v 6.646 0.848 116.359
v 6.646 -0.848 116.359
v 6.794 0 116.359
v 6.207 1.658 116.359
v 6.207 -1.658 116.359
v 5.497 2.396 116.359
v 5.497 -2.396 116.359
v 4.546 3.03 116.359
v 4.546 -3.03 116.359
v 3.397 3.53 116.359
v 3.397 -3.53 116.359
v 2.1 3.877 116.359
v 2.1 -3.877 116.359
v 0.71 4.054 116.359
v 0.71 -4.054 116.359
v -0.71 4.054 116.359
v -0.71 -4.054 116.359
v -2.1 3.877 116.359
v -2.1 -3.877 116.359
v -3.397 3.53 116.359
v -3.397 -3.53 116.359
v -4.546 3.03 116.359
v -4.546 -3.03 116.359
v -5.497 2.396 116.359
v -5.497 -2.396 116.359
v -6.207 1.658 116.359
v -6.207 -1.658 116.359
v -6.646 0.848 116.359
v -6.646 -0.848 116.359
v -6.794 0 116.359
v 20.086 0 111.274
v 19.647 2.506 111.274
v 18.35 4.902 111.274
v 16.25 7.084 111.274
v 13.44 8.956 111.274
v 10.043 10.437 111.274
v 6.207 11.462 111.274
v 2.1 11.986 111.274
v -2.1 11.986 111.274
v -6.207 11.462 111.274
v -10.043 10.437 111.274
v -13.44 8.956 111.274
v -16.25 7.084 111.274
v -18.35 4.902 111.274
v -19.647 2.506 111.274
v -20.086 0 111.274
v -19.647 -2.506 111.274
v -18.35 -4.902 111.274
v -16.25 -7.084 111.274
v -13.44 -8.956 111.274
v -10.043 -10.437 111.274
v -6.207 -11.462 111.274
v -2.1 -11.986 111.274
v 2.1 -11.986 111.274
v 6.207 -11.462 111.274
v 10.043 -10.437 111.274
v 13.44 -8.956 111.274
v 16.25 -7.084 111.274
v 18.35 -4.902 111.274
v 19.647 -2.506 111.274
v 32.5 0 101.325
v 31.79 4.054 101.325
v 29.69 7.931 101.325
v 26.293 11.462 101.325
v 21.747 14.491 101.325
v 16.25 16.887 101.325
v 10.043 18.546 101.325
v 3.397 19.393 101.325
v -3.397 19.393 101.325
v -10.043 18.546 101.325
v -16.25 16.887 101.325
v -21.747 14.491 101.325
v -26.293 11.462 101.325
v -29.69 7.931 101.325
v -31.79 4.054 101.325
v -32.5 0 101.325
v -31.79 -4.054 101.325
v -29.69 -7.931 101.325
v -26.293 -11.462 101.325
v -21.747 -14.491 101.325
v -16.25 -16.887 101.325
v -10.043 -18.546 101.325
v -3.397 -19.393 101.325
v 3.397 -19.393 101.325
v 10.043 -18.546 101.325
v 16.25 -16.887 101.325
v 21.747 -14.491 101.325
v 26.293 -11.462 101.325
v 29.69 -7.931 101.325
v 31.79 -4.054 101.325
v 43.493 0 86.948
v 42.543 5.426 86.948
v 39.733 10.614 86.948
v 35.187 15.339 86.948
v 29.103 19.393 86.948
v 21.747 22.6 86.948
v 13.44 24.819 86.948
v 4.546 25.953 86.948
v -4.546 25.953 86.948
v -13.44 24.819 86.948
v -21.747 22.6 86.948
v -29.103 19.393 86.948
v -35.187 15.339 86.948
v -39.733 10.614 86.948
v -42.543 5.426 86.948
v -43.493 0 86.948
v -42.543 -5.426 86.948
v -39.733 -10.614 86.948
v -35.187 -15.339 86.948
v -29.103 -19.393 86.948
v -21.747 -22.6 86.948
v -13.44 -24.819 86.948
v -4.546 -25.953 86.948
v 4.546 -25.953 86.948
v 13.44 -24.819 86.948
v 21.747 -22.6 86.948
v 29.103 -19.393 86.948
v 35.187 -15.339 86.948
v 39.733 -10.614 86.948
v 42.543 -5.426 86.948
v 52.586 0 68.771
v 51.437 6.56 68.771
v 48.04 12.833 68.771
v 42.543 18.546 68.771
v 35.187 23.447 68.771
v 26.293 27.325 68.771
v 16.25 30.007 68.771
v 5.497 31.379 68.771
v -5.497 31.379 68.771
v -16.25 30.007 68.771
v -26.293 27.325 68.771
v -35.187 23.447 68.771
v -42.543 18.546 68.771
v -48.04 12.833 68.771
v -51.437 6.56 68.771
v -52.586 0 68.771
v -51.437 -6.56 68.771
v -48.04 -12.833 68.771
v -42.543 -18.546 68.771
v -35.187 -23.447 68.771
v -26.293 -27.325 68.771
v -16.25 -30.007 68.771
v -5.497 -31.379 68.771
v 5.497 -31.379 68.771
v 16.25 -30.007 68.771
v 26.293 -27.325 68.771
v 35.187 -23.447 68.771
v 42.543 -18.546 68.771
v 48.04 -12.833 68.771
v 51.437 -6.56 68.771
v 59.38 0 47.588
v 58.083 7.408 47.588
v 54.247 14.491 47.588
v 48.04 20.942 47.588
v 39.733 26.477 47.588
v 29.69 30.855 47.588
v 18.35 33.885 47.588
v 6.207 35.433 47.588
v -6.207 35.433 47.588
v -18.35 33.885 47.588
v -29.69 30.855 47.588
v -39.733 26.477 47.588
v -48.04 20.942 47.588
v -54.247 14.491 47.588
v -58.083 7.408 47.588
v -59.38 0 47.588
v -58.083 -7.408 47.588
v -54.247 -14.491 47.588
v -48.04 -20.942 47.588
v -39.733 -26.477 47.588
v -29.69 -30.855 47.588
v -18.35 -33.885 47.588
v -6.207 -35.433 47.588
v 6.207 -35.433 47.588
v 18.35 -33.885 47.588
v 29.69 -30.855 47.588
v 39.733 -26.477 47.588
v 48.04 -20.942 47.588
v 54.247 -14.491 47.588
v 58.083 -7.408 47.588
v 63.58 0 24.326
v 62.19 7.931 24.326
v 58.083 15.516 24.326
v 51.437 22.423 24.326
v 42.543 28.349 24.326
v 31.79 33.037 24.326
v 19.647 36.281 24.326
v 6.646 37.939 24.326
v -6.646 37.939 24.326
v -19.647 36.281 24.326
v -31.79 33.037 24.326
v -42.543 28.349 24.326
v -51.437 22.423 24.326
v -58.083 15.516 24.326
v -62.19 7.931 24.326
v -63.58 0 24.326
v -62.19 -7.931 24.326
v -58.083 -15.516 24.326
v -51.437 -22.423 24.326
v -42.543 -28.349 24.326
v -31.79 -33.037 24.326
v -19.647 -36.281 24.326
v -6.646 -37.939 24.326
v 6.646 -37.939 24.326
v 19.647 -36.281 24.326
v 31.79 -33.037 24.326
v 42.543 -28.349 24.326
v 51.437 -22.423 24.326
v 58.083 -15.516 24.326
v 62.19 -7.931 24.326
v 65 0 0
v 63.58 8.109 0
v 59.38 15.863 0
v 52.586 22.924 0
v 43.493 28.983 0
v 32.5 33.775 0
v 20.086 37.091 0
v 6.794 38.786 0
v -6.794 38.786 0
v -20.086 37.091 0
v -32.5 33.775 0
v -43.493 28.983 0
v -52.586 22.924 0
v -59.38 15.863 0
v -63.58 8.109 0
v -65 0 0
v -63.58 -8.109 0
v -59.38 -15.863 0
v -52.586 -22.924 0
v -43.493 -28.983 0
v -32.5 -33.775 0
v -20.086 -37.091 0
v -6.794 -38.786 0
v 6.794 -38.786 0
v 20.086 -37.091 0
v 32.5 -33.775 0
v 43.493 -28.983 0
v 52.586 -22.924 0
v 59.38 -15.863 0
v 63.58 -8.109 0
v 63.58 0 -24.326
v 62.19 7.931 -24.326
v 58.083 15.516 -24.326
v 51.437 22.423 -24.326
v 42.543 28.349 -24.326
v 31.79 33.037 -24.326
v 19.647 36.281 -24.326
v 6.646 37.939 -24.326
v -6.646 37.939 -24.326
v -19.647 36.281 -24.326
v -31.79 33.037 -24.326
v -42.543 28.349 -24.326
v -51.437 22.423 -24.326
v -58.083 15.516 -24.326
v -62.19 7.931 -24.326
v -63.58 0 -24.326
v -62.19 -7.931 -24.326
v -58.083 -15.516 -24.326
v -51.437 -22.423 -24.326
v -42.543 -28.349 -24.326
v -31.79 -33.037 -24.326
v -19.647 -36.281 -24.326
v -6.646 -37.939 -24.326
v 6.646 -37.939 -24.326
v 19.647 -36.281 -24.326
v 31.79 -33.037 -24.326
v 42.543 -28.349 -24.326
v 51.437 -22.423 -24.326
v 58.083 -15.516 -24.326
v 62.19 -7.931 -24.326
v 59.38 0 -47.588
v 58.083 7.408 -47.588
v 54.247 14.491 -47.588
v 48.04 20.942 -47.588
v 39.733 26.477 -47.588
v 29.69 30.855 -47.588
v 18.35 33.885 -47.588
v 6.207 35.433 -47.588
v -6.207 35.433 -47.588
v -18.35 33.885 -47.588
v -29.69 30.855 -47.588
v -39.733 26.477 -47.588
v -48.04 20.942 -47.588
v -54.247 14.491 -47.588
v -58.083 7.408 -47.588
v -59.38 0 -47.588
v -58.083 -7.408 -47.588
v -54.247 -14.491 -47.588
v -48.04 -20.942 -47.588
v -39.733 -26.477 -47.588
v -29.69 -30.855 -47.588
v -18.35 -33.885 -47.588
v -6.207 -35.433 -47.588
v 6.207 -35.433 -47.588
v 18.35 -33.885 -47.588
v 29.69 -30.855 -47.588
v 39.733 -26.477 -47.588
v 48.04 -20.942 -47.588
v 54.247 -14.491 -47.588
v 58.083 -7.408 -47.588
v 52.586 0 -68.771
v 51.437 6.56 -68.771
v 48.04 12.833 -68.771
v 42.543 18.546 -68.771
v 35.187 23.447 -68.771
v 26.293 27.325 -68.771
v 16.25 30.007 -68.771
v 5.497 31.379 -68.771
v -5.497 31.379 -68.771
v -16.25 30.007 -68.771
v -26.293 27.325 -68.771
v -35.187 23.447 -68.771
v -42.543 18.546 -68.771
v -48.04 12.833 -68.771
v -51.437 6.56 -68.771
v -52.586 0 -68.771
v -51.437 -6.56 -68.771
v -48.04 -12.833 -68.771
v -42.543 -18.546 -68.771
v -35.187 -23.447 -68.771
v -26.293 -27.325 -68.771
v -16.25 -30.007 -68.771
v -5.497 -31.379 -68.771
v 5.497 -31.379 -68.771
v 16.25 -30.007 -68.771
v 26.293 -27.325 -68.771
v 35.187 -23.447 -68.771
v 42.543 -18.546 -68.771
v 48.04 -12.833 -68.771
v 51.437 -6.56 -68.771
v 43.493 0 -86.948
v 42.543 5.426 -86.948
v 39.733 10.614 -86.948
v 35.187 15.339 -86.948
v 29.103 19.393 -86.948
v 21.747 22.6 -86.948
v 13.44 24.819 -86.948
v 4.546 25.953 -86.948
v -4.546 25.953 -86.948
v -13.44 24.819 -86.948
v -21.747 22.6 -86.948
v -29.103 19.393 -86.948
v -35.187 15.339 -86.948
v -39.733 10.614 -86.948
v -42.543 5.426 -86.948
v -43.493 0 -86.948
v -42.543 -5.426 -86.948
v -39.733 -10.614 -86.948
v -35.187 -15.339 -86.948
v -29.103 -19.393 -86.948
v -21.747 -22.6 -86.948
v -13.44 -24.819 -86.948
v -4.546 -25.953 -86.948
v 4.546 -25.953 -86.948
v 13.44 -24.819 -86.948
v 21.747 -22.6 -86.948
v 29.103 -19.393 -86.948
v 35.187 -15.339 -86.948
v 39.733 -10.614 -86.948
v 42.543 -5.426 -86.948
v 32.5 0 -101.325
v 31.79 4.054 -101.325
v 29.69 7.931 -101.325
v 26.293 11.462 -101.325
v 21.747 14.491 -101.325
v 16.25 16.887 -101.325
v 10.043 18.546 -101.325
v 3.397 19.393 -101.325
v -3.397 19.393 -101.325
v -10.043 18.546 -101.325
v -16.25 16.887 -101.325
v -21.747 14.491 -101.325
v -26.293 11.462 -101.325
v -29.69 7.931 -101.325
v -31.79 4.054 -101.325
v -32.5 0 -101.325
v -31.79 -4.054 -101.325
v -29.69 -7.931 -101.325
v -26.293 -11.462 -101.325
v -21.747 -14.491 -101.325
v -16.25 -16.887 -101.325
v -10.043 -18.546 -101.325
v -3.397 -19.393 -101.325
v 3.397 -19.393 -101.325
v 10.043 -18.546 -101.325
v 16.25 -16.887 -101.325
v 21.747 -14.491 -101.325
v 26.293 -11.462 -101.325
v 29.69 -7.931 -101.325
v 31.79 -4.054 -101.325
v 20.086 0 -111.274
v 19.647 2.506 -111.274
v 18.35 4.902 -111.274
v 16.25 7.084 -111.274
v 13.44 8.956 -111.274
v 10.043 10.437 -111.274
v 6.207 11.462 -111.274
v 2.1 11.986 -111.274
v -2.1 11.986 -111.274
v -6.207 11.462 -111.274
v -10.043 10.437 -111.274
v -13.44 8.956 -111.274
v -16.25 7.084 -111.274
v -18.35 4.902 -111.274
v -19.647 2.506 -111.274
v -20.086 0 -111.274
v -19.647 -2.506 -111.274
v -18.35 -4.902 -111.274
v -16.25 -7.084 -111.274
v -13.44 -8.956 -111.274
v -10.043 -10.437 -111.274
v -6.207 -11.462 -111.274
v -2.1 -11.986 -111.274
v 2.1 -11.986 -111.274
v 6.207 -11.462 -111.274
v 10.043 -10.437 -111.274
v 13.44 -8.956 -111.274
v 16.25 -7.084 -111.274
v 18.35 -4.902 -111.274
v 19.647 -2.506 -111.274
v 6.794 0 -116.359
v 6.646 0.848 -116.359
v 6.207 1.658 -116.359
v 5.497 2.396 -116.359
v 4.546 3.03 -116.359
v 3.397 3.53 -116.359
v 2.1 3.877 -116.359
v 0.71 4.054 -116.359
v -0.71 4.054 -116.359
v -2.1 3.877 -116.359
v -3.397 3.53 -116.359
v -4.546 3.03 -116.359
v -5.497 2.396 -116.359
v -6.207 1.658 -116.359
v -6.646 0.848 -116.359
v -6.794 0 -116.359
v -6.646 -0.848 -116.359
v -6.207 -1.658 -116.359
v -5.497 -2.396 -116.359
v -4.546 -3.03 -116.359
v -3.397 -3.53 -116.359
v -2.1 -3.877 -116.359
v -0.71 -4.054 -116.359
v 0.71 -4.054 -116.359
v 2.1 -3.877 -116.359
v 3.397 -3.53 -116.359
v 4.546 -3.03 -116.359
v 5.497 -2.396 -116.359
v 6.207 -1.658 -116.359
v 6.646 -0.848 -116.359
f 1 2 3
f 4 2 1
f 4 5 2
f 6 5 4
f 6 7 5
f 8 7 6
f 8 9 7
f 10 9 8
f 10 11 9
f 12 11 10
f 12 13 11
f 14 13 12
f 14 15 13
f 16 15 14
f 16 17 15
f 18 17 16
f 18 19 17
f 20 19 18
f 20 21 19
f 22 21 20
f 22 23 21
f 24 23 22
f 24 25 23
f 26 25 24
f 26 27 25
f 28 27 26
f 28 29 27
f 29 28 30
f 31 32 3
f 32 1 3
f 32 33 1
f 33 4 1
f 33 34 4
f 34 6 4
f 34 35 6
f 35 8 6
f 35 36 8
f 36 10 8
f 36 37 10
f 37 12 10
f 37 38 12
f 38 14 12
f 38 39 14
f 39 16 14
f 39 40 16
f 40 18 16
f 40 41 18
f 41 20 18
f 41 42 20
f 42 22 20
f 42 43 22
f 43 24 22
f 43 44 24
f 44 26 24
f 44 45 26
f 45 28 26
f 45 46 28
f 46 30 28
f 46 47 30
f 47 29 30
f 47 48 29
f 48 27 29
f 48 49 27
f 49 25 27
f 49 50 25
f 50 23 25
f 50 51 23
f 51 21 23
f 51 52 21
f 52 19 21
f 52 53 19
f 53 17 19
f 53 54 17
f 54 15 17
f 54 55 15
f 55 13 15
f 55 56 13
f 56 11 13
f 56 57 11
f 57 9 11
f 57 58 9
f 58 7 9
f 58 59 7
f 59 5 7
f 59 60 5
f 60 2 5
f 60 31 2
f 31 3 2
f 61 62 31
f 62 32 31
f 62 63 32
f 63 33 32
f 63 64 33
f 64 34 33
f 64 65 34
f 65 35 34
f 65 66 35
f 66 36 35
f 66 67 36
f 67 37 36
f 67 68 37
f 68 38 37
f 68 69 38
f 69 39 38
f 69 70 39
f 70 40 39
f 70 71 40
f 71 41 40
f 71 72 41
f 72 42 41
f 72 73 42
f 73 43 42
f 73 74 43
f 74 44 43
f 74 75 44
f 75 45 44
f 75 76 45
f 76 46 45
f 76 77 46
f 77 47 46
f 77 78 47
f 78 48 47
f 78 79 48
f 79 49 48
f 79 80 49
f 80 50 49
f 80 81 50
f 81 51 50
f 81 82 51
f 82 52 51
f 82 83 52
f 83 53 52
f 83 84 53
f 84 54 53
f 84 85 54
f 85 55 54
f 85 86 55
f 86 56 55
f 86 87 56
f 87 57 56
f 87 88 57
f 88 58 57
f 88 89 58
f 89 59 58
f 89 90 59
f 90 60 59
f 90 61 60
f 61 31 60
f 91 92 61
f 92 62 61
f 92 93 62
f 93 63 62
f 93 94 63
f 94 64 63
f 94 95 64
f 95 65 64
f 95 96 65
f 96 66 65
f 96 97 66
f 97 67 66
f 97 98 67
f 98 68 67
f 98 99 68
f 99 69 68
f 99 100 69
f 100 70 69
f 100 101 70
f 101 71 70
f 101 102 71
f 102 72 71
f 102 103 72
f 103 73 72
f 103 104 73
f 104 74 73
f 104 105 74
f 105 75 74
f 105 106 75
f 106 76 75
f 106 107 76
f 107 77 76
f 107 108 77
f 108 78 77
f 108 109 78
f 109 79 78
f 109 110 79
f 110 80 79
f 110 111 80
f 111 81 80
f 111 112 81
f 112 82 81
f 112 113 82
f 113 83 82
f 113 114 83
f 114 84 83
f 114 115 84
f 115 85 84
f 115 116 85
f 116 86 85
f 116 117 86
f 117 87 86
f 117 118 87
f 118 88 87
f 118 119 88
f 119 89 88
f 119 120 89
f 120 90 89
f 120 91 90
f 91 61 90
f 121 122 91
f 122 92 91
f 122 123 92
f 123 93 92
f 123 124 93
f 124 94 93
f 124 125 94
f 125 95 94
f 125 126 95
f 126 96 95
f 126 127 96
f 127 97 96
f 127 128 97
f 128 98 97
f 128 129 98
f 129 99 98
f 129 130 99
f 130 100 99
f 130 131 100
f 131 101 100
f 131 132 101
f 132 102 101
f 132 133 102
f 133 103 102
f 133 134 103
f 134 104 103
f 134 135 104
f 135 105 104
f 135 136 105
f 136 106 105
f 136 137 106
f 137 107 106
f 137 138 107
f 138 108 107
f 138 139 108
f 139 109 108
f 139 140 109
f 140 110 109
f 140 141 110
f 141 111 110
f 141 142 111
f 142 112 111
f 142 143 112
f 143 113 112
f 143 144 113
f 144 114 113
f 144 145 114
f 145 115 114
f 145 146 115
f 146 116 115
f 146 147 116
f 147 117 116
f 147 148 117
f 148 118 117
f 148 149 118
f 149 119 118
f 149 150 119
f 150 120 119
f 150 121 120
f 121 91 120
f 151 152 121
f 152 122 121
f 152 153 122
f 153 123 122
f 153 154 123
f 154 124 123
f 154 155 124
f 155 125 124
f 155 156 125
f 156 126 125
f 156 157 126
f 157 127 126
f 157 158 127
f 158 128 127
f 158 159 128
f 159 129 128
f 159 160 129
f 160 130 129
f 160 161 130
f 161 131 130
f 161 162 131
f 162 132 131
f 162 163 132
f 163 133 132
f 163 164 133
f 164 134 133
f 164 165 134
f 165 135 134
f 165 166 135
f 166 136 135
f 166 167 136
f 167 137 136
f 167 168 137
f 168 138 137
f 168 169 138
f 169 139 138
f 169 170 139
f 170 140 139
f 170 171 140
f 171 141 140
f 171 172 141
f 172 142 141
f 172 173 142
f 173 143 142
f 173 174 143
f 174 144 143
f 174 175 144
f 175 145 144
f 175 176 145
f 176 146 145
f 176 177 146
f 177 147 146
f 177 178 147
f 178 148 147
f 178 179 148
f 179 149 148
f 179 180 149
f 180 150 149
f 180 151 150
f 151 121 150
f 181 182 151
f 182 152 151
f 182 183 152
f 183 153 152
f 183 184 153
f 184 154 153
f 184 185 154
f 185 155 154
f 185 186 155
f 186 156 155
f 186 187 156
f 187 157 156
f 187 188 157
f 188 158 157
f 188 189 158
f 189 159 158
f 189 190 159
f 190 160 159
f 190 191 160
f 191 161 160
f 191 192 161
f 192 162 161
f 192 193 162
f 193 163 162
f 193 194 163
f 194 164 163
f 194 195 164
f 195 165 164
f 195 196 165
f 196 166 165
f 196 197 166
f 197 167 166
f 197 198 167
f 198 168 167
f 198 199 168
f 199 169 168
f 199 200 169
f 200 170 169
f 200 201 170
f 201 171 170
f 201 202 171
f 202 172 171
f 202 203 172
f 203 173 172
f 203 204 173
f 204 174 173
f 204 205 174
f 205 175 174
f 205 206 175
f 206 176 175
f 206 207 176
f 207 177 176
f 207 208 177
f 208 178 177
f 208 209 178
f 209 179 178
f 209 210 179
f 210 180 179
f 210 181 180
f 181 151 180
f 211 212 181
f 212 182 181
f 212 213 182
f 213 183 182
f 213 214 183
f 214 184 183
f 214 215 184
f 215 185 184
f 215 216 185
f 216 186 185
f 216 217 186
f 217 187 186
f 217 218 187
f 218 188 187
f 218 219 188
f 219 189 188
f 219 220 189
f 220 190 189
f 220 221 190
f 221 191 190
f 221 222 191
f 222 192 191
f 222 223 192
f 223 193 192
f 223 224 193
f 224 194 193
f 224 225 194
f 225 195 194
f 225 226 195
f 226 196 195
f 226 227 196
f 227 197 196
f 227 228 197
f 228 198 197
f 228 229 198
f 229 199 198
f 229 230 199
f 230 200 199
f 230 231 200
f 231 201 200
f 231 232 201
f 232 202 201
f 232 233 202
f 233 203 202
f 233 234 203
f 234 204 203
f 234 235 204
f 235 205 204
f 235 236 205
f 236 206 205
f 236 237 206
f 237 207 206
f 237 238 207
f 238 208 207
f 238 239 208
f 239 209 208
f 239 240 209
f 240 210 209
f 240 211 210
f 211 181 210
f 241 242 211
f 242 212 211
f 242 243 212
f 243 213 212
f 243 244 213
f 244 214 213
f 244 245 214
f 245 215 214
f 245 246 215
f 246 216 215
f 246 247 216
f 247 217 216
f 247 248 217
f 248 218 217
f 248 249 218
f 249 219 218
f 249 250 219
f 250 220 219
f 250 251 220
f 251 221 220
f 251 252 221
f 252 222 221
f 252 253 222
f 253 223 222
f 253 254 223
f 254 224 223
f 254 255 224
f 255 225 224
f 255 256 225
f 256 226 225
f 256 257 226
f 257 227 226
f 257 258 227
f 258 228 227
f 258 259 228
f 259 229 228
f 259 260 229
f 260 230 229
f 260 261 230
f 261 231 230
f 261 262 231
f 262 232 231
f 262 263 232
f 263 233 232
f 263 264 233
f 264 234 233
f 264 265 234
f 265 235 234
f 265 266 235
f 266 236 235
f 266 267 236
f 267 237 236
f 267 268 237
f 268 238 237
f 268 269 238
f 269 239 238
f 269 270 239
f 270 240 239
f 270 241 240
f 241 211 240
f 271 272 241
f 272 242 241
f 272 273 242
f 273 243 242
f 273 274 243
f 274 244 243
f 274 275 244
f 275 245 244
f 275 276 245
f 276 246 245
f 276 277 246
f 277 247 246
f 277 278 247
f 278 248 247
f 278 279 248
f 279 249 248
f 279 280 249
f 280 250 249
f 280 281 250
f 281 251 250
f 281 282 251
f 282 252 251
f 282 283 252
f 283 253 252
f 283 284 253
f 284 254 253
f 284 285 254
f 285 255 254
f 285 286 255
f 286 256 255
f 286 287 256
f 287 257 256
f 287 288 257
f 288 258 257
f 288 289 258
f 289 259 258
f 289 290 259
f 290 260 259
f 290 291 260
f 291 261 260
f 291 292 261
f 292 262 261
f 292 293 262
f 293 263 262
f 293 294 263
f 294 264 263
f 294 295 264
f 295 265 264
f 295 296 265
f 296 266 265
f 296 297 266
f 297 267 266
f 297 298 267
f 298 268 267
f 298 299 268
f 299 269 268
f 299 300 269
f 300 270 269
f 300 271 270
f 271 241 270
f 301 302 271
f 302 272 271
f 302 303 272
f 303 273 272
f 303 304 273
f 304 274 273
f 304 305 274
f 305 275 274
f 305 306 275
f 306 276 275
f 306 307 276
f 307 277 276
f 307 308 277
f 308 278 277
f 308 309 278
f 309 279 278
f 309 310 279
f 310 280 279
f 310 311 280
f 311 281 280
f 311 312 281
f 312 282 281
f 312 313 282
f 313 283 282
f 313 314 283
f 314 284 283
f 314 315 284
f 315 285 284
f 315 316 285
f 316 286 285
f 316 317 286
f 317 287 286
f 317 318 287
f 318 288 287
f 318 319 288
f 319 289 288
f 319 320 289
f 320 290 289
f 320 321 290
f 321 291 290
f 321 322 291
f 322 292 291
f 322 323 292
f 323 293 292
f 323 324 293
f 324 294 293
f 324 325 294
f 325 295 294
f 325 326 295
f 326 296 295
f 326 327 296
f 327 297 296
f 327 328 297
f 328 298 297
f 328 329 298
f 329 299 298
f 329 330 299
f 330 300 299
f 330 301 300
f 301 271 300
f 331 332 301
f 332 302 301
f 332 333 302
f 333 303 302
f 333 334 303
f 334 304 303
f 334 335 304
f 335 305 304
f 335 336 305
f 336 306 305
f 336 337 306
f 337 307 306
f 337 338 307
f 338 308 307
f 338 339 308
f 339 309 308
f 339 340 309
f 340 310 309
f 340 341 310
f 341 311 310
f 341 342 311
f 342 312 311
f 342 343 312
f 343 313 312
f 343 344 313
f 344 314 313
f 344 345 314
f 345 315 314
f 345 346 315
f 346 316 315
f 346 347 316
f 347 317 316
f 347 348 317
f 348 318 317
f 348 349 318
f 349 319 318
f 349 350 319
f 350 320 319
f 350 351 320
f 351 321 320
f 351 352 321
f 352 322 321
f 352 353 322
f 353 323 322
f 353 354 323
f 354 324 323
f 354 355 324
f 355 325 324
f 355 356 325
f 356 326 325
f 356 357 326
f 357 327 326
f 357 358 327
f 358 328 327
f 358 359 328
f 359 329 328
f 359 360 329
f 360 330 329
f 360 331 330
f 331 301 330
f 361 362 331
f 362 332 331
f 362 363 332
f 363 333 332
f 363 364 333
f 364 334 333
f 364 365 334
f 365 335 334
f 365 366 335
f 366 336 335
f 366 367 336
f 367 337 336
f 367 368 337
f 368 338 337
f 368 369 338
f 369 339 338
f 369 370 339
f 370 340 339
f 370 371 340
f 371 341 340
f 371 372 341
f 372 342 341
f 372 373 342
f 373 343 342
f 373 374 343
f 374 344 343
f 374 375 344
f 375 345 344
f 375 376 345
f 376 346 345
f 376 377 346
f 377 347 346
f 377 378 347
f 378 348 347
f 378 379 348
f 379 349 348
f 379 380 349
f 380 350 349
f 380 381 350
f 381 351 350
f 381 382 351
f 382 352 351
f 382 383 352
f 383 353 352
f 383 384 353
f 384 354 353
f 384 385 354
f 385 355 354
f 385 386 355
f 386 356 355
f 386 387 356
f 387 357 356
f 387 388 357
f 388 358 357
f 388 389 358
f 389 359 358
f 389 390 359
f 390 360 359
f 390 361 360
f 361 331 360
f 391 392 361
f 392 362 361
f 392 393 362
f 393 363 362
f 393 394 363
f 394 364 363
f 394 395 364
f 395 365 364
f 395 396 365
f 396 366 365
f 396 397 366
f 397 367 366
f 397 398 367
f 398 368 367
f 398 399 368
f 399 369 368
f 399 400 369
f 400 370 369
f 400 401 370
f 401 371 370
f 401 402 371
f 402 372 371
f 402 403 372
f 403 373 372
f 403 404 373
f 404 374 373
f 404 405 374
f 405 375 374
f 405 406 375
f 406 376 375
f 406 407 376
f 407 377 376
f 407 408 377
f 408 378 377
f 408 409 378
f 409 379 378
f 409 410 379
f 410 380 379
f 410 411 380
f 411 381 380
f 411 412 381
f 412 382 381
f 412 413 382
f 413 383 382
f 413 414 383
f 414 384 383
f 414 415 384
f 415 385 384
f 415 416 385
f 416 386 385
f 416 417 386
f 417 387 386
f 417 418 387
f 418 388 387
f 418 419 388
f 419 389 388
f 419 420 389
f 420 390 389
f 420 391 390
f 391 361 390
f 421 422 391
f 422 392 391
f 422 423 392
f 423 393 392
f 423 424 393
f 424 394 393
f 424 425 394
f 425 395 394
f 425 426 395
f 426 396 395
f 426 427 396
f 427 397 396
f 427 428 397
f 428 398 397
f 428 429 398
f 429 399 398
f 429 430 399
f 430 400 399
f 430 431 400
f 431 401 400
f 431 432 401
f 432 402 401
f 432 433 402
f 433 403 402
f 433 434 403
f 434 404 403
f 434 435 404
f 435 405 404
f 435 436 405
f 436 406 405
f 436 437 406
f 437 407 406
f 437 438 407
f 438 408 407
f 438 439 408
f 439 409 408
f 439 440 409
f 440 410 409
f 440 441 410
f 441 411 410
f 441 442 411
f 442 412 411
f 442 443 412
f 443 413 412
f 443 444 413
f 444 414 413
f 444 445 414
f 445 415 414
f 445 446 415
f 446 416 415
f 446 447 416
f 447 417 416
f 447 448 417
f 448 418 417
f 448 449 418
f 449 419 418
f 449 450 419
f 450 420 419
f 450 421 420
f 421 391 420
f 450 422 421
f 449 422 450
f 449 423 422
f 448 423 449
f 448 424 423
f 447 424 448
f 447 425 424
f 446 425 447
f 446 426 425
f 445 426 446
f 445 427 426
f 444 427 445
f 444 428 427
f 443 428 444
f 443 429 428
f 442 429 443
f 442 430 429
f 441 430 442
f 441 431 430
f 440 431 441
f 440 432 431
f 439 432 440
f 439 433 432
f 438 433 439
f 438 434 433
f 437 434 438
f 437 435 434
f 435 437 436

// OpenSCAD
// Generated by SolidPython 1.0.1 on 2020-07-29 00:46:46


scale(v = [5, 3, 9]) {
	sphere(r = 13);
}
/***********************************************
*********      SolidPython code:      **********
************************************************
 
# import packages: SolidPython
from solid import *
from solid.utils import *
from itertools import chain, combinations, permutations


class Resize:

    def __init__(self, scad_file):
        self.scad_file = scad_file
        #self.scad_file = import_scad(scad_file)
        # cone/cylinder param:
        self.r1 = 0
        self.r2 = 0
        self.h = 0
        # rectangular prism param:
        self.w = 0
        self.l = 0
        # ellipse param:
        self.r = 0

    # import OpenScad code (file name corresponds to shape)


    # classify shape + parameters
    def assign(self, param1, param2, param3):
        if self.scad_file == 'cone.scad':
            self.r1 = param1
            self.r2 = param2
            self.h = param3
        elif self.scad_file == 'cylinder.scad':
            self.r1 = param1
            self.r2 = param2
            self.h = param3
        elif self.scad_file == 'rectangularPrism.scad':
            self.h = param1
            self.l = param2
            self.w = param3
        else:
            self.r = param1
            self.h = param2

    # resize parameters
    def iterate(self):
        x = range(3, 20, 2)
        i = 1
        if self.scad_file == 'cone.scad':
            tempList = list(permutations(x, 2))
            for temp in tempList:
                param1 = temp[0]
                param2 = temp[1]
                filepath = 'produced_scad_files/' + 'cone' + str(param1) + '_' + str(param2) + '_' + '.scad'
                scad_render_to_file(cylinder(h=param1, r1=param2, r2=0), filepath)

        elif self.scad_file == 'cylinder.scad':
            tempList = list(permutations(x, 3))
            for temp in tempList:
                param1 = temp[0]
                param2 = temp[1]
                filepath = 'produced_scad_files/' + 'cylinder' + str(param1) + '_' + str(param2) + '_' + '.scad'
                scad_render_to_file(cylinder(h=param1, r1=param2, r2=param2), filepath)

        elif self.scad_file == 'rectangularPrism.scad':
            tempList = list(permutations(x, 3))
            for temp in tempList:
                param1 = temp[0]
                param2 = temp[1]
                param3 = temp[2]
                filepath = 'produced_scad_files/' + 'rectangularPrism' + str(param1) + '_' + str(param2) + '_' + str(
                    param3) + '.scad'
                scad_render_to_file(cube(size=(param1, param2, param3)), filepath)

        elif self.scad_file == 'ellipse.scad':
            tempList = list(permutations(x, 4))
            for temp in tempList:
                param1 = temp[0]
                param2 = temp[1]
                param3 = temp[2]
                param4 = temp[3]
                filepath = 'produced_scad_files/' + 'ellipse' + str(param1) + '_' + str(param2) + '_' + str(param3) + '_' + str(param4) + '.scad'
                scad_render_to_file(scale([param1, param2, param3])(sphere(r=param4)), filepath)

    def render_to_scadfile(self):
        scad_render_to_file(scad, 'example.scad') 
 
************************************************/
